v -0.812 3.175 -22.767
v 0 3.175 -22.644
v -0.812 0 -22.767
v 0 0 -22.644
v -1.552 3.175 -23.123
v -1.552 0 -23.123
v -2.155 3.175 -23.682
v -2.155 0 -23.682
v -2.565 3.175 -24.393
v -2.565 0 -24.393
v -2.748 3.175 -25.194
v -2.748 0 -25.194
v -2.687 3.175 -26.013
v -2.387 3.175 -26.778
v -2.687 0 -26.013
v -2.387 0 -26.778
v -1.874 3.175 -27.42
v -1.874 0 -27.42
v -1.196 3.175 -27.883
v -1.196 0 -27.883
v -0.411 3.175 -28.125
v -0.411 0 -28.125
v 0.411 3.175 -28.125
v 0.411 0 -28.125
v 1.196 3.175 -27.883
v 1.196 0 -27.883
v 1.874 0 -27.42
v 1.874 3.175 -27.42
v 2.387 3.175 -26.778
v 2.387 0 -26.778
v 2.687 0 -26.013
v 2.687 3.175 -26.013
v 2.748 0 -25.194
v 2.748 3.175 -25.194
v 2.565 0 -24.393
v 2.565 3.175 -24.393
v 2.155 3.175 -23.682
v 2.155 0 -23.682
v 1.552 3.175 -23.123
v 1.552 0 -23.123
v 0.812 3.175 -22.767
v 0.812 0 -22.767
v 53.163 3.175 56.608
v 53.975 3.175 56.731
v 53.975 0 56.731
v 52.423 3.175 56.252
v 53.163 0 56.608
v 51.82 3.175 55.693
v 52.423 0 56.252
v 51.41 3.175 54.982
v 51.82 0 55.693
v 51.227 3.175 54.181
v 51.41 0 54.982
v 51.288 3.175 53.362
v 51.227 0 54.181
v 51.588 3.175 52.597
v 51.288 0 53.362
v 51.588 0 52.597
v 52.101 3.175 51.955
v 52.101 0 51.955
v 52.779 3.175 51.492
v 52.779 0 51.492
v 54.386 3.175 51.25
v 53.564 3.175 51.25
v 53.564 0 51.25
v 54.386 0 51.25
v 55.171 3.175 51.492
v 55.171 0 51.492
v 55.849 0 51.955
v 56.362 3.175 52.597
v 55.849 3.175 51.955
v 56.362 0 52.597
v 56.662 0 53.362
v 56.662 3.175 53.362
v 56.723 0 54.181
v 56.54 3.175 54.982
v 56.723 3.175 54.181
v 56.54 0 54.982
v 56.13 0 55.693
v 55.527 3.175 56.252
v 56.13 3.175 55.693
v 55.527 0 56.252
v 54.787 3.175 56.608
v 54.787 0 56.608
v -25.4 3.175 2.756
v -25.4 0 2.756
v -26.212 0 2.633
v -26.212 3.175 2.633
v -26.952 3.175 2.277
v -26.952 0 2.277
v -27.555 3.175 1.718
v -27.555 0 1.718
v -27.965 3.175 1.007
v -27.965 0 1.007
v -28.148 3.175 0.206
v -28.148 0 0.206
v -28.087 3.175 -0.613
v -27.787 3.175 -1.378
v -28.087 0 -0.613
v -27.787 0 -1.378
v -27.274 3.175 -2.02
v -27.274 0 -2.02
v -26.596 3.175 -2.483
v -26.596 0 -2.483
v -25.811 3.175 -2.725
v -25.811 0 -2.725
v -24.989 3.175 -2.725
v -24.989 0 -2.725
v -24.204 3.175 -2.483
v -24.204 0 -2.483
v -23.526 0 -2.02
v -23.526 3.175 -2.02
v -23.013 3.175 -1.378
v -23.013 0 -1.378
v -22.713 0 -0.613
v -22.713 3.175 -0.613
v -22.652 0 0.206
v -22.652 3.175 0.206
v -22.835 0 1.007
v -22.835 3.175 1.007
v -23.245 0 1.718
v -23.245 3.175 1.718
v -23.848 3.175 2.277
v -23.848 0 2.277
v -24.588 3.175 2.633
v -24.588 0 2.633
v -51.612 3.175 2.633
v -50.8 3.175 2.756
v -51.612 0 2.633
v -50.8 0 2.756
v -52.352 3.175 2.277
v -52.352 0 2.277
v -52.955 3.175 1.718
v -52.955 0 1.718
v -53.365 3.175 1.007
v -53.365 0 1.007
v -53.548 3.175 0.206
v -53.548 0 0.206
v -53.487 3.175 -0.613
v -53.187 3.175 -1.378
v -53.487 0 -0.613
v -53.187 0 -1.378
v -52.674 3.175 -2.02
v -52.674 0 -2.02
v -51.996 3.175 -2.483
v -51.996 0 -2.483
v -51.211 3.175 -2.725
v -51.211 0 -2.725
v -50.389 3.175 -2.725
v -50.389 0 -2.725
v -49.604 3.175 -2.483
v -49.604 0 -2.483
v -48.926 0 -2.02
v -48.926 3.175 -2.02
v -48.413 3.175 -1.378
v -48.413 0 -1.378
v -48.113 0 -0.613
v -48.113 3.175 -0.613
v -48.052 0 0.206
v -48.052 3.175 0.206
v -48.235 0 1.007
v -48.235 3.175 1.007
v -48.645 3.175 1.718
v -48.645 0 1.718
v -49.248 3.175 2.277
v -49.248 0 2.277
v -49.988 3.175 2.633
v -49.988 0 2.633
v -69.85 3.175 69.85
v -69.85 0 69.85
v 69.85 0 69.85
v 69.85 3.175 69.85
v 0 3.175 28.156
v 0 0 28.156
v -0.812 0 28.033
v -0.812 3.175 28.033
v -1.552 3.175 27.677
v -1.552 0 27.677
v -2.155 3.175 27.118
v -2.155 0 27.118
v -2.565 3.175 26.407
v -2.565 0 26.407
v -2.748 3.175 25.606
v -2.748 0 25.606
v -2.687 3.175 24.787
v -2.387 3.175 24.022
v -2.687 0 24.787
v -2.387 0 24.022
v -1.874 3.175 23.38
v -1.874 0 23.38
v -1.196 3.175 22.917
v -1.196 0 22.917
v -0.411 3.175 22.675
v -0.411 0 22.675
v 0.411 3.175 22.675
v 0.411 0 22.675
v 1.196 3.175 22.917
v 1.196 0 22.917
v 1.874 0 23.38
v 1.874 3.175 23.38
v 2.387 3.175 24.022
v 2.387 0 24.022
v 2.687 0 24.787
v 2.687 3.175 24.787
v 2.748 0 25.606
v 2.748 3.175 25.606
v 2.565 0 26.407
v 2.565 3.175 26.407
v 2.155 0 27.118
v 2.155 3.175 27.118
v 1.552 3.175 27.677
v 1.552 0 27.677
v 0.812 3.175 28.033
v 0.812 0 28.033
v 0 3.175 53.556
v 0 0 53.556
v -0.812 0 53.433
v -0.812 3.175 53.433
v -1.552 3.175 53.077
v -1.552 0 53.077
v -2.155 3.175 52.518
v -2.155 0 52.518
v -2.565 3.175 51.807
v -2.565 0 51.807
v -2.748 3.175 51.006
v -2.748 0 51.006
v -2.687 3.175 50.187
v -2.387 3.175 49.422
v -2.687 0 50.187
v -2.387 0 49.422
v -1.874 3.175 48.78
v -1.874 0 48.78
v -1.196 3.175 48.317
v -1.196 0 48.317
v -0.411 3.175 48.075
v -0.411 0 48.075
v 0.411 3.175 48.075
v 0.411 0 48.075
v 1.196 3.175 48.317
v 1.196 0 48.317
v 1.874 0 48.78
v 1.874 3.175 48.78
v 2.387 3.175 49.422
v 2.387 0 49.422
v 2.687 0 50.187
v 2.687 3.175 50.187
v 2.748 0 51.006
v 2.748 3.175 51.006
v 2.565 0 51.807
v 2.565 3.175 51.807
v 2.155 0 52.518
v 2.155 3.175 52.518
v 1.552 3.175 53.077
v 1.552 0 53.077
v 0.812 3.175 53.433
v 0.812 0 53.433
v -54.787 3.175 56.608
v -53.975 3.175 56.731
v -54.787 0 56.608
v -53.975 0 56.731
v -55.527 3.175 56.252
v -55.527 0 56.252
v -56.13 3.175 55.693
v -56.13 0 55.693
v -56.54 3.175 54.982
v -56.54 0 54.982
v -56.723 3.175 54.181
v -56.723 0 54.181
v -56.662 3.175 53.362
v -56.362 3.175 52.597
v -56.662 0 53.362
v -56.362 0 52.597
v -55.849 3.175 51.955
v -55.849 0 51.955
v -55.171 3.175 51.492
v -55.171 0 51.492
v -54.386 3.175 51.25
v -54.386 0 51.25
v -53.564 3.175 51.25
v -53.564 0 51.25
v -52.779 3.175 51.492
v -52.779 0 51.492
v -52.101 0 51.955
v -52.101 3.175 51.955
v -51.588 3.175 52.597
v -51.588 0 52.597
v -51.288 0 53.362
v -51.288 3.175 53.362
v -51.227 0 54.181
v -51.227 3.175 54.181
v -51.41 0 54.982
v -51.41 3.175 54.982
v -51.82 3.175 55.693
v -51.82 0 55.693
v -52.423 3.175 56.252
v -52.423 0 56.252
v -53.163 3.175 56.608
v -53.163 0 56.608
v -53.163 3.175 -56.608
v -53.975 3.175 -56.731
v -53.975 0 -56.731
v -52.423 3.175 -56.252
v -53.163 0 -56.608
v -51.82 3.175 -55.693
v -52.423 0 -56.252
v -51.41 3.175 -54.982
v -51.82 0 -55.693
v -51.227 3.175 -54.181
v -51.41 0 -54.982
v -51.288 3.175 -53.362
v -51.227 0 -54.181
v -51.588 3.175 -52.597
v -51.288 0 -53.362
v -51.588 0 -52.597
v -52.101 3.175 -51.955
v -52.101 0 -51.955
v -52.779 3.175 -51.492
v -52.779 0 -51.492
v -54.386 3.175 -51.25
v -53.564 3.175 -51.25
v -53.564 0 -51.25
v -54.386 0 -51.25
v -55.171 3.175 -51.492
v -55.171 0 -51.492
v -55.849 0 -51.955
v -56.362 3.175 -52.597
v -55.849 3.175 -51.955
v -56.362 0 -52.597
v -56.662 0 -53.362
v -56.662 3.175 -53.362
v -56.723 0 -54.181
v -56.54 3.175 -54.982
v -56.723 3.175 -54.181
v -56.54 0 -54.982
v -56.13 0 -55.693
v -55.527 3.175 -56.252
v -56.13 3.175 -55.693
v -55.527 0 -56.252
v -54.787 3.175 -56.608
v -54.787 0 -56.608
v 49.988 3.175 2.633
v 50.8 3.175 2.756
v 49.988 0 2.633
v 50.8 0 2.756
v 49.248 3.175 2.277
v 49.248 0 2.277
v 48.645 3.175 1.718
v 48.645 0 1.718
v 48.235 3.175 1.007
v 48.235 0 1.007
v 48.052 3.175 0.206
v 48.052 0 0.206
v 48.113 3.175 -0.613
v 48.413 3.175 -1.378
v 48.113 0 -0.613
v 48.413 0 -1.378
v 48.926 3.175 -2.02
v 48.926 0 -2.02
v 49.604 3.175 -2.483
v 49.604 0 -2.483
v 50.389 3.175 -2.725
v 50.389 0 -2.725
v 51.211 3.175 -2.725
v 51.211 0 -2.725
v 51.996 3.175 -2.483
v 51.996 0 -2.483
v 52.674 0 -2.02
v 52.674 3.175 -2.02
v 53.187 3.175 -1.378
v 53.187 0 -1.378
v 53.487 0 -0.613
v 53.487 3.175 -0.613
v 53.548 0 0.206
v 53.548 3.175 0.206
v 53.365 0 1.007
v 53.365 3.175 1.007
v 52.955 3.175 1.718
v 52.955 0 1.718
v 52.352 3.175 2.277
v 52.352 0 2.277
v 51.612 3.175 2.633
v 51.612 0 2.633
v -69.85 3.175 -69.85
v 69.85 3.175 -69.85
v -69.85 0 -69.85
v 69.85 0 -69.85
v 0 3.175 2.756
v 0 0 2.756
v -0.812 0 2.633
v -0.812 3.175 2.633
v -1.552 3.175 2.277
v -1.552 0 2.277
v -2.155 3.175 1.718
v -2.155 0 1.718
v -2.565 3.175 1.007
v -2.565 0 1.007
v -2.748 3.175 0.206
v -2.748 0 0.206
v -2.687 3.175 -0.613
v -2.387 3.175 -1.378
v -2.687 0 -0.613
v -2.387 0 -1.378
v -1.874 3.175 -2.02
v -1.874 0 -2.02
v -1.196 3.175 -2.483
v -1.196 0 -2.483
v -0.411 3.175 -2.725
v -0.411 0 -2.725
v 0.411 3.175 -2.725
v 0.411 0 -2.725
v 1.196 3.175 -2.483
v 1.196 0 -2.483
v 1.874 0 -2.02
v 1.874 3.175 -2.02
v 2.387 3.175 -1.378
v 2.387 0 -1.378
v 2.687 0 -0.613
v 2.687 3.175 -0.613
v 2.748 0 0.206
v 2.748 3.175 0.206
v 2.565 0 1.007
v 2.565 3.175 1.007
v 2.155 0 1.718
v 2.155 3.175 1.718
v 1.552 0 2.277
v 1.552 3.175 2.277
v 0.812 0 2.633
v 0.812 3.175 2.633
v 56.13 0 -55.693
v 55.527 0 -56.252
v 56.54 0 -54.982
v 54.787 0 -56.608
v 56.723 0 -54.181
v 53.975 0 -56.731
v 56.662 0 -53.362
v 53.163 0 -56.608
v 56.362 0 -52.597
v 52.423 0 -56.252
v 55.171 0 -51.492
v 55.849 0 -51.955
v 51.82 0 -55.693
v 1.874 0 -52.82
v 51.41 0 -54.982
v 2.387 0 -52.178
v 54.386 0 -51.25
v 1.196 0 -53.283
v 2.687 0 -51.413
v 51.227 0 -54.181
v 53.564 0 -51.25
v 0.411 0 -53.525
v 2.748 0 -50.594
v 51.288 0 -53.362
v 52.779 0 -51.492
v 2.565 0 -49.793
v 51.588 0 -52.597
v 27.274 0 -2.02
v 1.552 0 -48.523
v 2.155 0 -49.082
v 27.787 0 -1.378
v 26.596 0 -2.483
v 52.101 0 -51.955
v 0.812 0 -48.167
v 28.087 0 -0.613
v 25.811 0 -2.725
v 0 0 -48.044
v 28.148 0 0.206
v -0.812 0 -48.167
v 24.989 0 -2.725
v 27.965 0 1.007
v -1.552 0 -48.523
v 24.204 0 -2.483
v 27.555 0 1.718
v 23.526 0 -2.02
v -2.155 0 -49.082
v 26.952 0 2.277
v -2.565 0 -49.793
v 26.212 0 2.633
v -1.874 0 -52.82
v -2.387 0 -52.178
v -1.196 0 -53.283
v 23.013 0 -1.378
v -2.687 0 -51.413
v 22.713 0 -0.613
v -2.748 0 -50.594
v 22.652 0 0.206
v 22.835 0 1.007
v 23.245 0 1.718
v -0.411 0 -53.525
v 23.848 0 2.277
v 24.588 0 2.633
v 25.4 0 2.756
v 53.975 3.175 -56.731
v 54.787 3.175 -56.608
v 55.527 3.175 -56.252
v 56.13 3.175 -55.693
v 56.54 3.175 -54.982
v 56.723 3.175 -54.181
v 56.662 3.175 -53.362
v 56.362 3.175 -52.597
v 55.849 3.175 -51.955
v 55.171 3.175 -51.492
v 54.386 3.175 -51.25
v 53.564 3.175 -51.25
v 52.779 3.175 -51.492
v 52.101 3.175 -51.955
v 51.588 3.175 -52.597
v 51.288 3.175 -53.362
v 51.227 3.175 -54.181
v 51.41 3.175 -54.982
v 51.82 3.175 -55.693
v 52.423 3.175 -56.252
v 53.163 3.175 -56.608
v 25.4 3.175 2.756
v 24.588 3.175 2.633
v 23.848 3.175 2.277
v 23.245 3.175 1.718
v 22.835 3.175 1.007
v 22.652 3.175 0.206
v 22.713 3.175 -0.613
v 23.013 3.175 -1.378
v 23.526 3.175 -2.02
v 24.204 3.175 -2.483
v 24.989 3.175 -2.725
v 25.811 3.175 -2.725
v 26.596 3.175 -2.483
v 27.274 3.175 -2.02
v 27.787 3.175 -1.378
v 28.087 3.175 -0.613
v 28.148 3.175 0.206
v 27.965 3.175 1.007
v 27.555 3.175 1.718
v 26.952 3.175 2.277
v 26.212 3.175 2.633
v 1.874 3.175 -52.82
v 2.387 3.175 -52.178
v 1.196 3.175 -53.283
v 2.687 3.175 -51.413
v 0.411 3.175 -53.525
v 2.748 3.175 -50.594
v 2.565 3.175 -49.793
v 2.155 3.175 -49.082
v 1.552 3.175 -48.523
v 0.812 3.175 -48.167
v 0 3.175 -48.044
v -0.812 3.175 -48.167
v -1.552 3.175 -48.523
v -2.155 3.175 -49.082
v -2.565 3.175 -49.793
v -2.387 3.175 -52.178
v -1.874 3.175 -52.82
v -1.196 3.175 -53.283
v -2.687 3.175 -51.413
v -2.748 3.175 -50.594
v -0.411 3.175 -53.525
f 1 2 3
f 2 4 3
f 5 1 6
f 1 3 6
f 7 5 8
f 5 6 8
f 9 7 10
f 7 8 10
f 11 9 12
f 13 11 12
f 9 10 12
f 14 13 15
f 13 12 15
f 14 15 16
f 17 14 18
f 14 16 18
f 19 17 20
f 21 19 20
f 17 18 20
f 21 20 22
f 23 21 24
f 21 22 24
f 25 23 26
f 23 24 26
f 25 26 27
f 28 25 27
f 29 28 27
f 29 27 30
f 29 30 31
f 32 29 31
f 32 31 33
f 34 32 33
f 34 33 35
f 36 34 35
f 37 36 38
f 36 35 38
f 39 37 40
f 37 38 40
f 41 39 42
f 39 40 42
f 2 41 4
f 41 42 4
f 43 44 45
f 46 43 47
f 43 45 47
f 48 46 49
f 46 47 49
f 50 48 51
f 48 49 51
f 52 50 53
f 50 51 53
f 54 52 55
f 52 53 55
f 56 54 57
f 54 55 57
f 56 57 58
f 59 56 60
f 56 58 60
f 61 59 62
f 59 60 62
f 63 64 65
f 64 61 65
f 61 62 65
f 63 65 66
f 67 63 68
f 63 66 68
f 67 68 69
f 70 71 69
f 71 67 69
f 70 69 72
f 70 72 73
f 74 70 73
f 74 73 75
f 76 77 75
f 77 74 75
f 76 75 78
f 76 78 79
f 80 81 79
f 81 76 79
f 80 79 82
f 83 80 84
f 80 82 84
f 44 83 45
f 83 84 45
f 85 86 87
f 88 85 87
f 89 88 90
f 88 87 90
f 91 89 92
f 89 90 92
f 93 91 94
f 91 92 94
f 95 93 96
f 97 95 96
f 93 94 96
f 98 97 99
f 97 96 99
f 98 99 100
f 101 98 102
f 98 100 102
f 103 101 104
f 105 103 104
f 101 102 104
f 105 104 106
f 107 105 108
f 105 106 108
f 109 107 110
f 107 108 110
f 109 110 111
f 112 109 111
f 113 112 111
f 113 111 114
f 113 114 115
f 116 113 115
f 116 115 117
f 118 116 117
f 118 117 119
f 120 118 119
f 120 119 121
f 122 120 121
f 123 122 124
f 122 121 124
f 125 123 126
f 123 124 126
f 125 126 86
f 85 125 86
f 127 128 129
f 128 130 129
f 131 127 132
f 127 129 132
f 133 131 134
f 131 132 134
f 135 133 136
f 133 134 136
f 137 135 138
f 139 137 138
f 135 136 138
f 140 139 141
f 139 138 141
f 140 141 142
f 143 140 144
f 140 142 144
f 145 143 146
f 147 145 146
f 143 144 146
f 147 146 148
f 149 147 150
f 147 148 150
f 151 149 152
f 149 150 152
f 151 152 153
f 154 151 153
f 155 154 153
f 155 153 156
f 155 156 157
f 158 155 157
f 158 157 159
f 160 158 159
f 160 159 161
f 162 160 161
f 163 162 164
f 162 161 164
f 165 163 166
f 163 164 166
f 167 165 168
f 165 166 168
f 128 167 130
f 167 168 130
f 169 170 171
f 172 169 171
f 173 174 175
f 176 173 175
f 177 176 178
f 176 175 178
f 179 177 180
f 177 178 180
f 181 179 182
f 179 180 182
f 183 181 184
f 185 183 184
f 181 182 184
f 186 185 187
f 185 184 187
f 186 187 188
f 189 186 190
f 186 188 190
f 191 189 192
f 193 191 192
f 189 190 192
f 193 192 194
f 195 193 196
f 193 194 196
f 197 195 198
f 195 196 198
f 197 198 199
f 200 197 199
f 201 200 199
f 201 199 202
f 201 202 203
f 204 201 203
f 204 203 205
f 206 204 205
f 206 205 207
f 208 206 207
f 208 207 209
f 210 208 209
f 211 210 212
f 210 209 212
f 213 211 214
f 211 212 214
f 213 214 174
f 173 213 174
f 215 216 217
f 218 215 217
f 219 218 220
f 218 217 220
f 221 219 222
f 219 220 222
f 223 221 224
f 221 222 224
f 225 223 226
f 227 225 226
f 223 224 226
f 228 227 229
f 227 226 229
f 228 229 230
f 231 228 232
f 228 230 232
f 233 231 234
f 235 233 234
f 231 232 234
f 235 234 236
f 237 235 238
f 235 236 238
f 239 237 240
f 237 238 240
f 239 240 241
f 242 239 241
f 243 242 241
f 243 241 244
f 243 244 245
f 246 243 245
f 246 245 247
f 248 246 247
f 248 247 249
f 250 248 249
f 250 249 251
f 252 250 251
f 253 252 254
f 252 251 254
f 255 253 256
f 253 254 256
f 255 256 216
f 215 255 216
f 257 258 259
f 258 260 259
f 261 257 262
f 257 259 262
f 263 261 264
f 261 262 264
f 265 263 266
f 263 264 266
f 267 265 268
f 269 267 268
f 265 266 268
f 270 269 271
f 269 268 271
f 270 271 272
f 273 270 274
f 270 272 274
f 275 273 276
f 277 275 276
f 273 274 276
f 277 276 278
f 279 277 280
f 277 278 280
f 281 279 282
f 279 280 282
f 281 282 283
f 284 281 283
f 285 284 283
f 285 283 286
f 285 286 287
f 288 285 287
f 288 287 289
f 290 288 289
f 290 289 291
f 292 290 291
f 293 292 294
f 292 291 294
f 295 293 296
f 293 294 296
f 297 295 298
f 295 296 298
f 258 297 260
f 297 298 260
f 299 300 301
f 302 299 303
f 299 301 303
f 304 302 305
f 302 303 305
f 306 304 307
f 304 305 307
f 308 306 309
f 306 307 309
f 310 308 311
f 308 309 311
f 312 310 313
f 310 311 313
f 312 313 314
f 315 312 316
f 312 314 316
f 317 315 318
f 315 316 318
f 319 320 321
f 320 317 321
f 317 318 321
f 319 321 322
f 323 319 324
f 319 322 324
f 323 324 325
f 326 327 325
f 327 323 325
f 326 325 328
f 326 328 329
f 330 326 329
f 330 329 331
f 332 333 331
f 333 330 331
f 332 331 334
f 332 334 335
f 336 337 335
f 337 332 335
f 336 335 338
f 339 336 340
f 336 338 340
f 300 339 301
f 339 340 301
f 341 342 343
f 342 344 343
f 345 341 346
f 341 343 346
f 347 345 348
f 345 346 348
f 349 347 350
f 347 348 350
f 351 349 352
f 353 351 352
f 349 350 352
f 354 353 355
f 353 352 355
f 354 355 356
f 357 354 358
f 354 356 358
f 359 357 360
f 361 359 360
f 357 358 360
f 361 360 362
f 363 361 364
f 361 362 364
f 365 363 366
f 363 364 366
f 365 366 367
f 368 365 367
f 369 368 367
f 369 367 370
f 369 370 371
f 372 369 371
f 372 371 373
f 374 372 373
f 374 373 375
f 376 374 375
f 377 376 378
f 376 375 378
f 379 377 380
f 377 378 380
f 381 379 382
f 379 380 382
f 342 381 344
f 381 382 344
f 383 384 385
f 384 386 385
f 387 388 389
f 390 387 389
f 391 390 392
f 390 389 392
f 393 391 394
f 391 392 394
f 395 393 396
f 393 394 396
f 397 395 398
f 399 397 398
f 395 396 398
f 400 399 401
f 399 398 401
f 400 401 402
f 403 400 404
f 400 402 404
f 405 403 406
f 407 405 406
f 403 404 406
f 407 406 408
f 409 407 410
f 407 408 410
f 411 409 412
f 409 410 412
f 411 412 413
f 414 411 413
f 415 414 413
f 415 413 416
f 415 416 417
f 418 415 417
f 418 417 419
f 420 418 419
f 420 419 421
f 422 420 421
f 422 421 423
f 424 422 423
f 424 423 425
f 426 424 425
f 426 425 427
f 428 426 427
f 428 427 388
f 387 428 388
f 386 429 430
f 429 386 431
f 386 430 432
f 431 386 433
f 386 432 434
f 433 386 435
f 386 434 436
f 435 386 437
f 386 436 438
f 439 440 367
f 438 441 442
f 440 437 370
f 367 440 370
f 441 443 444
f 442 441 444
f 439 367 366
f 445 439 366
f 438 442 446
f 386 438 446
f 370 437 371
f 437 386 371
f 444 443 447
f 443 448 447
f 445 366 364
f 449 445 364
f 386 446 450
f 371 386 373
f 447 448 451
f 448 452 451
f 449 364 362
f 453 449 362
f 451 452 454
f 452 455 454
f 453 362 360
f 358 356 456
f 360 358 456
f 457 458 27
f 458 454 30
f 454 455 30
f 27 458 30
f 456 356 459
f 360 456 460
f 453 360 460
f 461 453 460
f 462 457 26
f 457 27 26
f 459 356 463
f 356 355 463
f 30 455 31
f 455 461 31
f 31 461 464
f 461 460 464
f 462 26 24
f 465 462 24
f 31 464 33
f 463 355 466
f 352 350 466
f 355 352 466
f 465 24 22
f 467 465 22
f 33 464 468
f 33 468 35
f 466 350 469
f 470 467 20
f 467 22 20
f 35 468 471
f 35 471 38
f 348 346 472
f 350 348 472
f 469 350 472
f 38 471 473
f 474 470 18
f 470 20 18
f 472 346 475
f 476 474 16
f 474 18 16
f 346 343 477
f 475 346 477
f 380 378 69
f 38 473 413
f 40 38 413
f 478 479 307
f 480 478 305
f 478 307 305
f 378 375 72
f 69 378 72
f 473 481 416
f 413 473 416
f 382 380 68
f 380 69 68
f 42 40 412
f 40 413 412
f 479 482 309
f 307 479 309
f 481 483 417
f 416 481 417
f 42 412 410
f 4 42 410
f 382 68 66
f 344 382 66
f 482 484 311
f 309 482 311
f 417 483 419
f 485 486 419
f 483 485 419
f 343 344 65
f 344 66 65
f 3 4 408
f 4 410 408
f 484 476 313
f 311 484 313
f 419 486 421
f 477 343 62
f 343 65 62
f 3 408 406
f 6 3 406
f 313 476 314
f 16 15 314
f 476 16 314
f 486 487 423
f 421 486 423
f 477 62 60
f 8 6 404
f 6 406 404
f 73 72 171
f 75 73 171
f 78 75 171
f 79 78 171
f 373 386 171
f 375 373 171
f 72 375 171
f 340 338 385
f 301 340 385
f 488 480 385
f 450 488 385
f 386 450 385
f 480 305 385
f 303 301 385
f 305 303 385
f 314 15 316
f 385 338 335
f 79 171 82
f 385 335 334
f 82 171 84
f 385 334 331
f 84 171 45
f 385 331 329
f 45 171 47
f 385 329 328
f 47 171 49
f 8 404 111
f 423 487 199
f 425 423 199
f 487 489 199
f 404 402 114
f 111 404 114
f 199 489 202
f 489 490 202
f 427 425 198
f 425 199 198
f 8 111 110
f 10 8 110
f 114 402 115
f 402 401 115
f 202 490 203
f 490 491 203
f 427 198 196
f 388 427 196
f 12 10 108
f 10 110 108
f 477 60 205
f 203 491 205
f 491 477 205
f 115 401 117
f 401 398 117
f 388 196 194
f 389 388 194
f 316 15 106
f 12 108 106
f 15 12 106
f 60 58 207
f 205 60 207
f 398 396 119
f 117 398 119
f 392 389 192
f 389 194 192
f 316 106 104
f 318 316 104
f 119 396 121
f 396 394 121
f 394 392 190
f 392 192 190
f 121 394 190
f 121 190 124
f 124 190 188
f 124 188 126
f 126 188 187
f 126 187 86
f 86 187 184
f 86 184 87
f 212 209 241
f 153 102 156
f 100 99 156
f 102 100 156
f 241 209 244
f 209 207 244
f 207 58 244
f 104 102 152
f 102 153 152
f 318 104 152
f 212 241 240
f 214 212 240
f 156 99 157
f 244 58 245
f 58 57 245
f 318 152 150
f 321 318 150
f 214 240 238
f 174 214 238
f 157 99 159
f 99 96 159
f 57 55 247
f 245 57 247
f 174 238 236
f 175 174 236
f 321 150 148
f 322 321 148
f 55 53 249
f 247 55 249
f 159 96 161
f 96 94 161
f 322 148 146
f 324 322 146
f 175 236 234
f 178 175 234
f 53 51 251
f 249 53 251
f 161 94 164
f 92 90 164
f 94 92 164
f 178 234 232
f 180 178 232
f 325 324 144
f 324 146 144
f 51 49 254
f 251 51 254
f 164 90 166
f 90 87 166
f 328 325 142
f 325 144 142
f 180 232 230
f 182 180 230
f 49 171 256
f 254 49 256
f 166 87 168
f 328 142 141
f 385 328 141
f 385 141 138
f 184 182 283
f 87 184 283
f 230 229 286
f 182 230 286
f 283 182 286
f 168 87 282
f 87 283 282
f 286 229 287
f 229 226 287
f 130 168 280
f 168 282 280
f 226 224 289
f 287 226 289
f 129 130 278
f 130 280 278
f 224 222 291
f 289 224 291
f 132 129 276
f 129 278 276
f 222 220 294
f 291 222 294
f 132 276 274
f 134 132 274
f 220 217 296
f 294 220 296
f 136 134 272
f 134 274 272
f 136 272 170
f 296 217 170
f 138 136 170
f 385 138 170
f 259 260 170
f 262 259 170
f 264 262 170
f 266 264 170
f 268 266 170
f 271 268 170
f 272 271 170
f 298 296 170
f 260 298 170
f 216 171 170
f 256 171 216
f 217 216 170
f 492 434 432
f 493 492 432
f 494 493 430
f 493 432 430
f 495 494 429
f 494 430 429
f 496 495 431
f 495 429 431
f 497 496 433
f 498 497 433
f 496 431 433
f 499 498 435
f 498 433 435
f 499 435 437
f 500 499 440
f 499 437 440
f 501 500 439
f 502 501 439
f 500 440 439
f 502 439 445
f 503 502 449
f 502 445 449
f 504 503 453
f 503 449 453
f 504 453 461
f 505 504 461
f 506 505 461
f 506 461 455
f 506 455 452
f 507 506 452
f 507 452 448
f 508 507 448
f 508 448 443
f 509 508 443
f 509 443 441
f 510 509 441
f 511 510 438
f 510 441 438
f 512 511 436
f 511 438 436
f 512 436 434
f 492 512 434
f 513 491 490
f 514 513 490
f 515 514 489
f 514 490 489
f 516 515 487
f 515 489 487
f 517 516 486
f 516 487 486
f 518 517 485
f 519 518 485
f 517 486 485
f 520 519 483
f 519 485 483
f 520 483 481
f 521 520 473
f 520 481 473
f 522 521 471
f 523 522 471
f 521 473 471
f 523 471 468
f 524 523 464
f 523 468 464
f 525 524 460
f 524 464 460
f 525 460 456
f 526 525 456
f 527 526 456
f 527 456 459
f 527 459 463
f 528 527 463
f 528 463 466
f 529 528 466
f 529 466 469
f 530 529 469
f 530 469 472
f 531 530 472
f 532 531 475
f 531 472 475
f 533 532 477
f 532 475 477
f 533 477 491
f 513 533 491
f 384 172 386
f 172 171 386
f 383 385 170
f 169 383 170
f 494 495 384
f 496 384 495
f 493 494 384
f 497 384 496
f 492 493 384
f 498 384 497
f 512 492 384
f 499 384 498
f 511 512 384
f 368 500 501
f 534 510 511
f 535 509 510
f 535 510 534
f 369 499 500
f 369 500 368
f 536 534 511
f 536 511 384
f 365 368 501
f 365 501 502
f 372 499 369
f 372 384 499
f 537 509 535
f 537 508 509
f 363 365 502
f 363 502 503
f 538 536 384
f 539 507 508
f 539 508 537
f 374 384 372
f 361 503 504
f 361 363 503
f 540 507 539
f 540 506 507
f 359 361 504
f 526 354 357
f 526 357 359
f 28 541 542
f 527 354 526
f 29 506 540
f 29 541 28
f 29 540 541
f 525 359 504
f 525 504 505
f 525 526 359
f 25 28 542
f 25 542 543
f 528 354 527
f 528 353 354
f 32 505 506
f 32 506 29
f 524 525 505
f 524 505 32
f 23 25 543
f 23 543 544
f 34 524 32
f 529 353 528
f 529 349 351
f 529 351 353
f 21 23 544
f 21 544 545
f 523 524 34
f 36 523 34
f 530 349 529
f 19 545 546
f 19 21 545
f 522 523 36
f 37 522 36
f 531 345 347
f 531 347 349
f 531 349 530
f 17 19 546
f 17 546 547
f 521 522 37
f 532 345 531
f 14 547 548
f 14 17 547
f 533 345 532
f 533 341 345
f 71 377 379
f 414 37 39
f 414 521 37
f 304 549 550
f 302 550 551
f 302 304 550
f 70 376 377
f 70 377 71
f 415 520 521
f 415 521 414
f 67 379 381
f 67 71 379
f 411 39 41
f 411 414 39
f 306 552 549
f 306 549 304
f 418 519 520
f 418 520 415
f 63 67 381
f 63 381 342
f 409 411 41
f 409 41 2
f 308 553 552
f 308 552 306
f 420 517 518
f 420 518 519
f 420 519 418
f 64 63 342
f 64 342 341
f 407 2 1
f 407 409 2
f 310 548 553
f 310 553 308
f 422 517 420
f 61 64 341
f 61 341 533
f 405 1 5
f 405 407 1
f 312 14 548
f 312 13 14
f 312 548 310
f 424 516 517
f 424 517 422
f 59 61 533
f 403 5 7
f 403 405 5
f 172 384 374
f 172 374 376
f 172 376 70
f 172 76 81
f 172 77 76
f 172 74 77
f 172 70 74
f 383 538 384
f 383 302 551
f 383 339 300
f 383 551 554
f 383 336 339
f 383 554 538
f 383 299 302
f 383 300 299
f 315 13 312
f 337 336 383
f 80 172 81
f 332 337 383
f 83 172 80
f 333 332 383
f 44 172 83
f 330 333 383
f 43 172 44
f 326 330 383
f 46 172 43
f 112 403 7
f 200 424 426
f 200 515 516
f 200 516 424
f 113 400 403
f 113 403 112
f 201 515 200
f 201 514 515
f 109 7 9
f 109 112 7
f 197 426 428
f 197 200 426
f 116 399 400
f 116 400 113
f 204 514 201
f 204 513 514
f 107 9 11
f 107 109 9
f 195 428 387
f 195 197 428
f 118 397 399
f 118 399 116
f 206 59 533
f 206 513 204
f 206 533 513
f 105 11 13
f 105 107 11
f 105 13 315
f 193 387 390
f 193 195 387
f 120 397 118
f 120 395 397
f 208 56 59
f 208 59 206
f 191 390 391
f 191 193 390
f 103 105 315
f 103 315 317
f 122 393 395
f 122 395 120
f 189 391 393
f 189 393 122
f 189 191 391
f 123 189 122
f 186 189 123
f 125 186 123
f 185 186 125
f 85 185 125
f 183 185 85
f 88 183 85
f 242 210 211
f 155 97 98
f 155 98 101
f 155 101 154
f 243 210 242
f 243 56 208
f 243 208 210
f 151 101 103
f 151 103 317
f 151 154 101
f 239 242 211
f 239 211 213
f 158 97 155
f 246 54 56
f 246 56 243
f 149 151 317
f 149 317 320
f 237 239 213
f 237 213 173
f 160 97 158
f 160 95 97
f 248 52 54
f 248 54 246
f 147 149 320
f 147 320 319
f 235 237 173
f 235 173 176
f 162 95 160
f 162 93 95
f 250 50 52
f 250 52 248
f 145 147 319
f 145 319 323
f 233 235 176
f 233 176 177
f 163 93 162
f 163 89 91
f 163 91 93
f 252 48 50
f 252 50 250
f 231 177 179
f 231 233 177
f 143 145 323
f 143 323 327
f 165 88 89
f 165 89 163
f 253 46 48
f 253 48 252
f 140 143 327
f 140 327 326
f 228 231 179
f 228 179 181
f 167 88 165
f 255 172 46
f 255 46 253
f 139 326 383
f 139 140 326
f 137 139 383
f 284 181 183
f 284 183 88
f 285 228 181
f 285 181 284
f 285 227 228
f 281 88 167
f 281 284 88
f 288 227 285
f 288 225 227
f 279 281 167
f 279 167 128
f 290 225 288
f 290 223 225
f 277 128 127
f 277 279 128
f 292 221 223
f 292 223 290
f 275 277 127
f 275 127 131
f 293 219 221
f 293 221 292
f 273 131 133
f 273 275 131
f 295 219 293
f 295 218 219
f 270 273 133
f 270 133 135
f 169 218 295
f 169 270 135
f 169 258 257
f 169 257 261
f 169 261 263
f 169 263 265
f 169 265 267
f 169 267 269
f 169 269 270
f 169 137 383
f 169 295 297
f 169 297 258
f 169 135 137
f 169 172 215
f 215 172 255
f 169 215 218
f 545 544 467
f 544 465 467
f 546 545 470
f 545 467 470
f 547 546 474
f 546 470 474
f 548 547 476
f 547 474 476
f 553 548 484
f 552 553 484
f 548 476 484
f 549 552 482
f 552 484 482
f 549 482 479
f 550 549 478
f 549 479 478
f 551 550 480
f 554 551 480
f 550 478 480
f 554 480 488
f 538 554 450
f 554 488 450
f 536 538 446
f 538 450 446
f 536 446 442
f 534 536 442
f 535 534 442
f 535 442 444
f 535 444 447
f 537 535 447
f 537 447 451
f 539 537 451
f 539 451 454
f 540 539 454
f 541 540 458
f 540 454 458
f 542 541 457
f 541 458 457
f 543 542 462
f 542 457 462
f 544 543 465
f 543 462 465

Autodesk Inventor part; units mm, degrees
ref_plane "YZ Plane" through (0, 0, 0) normal (1, 0, 0) x (0, 1, 0)
ref_plane "XZ Plane" through (0, 0, 0) normal (0, 1, 0) x (-1, 0, 0)
ref_plane "XY Plane" through (0, 0, 0) normal (0, 0, 1) x (1, 0, 0)
sketch "Sketch1" plane through (0, 0, 0) normal (0, 1, 0) x (-1, 0, 0)
  line L0 (69.85, 69.85) -> (-69.85, 69.85)
  line L1 (-69.85, 69.85) -> (-69.85, -69.85)
  line L2 (-69.85, -69.85) -> (69.85, -69.85)
  line L3 (69.85, -69.85) -> (69.85, 69.85)
  line L4 (97.79, 0) -> (-97.79, 0) projected
  line L5 (0, -97.79) -> (0, 97.79) projected
  point P0 (0, 0)
  dimension "d0" = 139.7
  dimension "d1" = 139.7
extrude "Extrusion1" add sketch "Sketch1" along normal blind 3.175
sketch "Sketch2" plane through (0, 3.175, 0) normal (0, 1, 0) x (1, 0, 0)
  line L0 (-69.85, 69.85) -> (-69.85, -69.85) projected
  line L1 (-69.85, -69.85) -> (-69.85, -53.975)
  line L2 (-69.85, -53.975) -> (-53.975, -53.975)
  point P0 (0, 0)
  dimension "d4" = 15.875
  dimension "d5" = 15.875
hole "Hole1" at (-53.975, 3.175, 53.975) direction (0, -1, 0) diameter 5.5118 depth 14.1986 tip angle 118 clearance for "Flat Head Machine Screw" size "M5" standard "Ansi Metric M Profile"
mirror "Mirror4" about plane through (0, 0, 0) normal (0, 0, 1) of "Hole1"
mirror "Mirror5" about plane through (0, 0, 0) normal (1, 0, 0) of "Hole1", "Mirror4"
sketch "Sketch5" plane through (0, 3.175, 0) normal (0, 1, 0) x (1, 0, 0)
  point P0 (0, 0)
  point P1 (0, 0)
hole "Hole3" at (0, 3.175, 0) direction (0, -1, 0) diameter 5.5118 end through all
pattern_linear "Rectangular Pattern2" count 5 spacing 25.4 along (1, 0, 0) of "Hole3" first direction both ways yes
pattern_linear "Rectangular Pattern3" count 5 spacing 25.4 along (0, 0, 1) of "Hole3" first direction both ways yes
equation "\"d0\" = d1"
equation "\"d4\" = d5"
properties part number "DIFF_HOUSING_TOP"
